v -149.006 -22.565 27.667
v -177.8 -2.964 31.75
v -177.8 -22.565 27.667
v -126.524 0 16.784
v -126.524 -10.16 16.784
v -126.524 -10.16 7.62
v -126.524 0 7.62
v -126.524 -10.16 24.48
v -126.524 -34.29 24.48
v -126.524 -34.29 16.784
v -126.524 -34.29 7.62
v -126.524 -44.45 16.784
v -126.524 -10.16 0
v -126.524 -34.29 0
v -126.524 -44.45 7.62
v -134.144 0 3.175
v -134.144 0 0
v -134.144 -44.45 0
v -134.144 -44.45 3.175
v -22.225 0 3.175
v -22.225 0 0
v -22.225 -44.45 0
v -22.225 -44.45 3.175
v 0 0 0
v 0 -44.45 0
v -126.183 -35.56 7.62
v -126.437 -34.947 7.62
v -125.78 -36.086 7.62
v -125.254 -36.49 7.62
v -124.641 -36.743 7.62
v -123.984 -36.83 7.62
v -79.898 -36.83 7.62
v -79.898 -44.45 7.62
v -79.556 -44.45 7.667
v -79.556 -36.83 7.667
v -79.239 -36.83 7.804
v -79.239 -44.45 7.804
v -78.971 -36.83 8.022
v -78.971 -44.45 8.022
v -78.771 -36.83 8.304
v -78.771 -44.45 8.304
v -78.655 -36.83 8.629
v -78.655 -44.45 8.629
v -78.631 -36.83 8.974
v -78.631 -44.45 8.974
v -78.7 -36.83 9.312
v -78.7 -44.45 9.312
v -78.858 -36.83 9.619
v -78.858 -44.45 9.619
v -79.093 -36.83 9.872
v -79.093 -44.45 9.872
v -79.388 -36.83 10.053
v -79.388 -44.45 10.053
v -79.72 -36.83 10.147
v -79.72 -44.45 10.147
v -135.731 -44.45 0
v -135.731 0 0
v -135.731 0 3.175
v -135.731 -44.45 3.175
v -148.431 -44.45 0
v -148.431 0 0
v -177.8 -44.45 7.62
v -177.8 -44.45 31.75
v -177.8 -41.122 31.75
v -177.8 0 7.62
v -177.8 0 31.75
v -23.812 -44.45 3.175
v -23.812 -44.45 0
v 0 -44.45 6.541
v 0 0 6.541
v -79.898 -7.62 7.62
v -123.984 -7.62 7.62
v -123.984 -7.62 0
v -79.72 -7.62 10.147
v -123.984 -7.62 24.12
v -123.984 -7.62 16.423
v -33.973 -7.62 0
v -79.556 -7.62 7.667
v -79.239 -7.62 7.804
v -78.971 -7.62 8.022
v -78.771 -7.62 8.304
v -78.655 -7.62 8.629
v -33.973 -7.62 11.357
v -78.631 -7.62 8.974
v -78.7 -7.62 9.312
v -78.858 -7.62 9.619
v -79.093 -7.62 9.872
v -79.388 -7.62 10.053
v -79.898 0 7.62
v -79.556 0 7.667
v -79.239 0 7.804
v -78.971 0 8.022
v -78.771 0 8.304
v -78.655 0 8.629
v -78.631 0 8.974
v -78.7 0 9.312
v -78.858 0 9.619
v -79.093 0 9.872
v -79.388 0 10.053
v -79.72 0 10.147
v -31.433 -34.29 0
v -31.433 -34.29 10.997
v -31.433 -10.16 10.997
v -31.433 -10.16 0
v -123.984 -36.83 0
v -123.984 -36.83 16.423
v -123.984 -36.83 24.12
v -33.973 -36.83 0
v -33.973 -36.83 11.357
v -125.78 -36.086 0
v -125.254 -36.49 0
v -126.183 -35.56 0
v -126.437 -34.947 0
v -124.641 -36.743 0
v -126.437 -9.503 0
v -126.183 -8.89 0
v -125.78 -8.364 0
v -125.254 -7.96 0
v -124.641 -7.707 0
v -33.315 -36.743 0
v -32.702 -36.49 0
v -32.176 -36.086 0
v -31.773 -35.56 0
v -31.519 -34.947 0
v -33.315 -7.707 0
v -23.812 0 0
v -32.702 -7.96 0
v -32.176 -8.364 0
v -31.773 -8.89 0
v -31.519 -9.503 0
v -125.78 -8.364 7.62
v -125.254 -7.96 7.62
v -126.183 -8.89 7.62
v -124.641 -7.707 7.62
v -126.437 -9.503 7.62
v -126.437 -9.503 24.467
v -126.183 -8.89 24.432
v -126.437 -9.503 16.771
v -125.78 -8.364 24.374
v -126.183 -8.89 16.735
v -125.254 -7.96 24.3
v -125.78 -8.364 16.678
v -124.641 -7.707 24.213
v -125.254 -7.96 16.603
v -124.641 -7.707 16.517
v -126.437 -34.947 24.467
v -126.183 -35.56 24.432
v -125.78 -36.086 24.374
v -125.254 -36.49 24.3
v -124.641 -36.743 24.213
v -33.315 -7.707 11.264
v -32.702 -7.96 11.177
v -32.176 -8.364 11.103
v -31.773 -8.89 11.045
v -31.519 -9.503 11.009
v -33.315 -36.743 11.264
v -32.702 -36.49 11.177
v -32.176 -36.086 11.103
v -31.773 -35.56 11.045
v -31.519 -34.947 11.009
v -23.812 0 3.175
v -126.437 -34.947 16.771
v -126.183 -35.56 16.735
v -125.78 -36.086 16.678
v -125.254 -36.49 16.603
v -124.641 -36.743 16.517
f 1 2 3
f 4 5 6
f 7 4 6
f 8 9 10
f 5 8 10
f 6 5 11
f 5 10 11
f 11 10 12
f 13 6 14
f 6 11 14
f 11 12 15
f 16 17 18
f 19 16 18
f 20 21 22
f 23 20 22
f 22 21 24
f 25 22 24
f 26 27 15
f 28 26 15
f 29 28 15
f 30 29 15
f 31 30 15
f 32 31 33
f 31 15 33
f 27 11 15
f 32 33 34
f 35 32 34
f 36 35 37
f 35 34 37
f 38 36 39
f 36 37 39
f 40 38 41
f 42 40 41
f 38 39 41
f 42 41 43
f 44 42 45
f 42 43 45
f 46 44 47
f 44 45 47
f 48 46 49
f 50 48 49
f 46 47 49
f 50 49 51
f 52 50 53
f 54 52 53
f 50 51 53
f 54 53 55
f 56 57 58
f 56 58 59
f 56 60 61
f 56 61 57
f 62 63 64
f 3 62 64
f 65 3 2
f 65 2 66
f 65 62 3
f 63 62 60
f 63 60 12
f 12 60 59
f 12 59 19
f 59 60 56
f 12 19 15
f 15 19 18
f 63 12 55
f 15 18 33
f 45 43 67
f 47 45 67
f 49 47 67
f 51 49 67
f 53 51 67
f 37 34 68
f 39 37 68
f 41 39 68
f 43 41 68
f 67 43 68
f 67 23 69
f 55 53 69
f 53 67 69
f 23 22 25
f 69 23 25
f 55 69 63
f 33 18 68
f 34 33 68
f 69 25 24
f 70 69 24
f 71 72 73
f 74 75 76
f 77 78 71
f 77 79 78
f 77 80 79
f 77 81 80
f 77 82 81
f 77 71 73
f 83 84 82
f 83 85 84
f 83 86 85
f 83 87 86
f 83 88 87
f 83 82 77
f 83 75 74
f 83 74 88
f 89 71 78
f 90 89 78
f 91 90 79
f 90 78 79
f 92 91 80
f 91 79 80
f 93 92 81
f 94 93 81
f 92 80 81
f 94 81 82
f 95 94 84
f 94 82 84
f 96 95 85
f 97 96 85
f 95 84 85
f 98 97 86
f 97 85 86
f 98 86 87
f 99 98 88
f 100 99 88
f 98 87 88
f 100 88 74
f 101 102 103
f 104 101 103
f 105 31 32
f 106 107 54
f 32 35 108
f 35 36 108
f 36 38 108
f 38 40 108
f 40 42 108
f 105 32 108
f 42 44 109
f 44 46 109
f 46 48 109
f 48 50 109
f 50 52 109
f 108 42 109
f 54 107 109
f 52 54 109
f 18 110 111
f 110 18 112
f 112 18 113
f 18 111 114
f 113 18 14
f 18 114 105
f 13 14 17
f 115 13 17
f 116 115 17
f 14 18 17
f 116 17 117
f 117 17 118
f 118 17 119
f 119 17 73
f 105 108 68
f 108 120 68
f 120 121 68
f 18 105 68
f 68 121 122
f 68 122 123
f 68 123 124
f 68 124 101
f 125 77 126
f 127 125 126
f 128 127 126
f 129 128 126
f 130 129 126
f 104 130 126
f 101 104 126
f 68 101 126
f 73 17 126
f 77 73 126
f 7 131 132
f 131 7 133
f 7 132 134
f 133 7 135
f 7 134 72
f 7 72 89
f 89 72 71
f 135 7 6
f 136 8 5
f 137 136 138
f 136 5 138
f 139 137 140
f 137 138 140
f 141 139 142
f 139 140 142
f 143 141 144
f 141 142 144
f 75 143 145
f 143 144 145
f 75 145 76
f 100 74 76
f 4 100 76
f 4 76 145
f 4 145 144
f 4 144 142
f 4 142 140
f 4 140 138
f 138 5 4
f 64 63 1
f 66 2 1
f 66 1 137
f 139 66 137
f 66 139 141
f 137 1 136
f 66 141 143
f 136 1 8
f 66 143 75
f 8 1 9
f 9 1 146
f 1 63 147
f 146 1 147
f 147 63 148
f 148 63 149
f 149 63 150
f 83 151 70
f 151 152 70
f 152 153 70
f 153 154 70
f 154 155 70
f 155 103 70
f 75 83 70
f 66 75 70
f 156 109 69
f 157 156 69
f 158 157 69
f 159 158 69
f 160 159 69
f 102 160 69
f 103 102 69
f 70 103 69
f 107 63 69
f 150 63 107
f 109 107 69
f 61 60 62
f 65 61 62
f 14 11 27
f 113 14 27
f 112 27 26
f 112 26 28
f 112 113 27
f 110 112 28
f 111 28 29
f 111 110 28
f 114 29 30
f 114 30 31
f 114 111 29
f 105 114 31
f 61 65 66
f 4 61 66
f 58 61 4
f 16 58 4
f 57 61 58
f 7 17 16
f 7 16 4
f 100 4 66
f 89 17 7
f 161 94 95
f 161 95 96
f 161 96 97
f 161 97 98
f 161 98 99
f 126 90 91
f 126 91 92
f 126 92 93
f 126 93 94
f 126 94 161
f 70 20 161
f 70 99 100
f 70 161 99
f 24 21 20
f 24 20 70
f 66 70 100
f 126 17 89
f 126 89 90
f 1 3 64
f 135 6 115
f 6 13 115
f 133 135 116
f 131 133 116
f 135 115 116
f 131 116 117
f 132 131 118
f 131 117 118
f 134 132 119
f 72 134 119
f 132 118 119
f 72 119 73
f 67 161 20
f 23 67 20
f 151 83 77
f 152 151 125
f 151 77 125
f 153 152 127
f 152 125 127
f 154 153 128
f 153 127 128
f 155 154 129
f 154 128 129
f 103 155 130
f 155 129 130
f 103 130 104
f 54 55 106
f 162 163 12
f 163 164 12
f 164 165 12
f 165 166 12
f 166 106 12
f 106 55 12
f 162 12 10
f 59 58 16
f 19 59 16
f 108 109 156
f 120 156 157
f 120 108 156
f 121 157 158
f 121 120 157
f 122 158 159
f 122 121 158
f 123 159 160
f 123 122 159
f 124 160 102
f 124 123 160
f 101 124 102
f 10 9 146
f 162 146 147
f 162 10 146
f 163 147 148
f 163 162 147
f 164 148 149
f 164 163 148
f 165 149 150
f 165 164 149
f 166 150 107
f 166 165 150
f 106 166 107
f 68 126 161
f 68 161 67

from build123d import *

# Parameters (mm, degrees)
F0_W      = 177.8
F0_H      = 44.45
F1_DEPTH  = 31.75
F2_W      = 1.5875
F2_H      = 44.45
F3_DEPTH  = 3.175
F4_W      = 95.09125
F4_H      = 29.21
F5_DEPTH  = 31.751
F7_DEPTH  = 44.451
F9_DEPTH  = 44.451
F11_DEPTH = 44.451
F13_DEPTH = 177.801
F14_R     = 2.54


with BuildPart() as f1:
    # F0 (on Top) → F1 (new body)
    with BuildSketch(Plane.XY):
        with Locations((-88.9, -22.225)):
            Rectangle(F0_W, F0_H)
    extrude(amount=F1_DEPTH)

    # F2 (on face) → F3 (cut)
    with BuildSketch(Plane(origin=(0, 0, 0), x_dir=(1, 0, 0), z_dir=(0, 0, -1))):
        with Locations((-23.01875, 22.225)):
            Rectangle(F2_W, F2_H)
        with Locations((-134.9375, 22.225)):
            Rectangle(F2_W, F2_H)
    extrude(amount=-F3_DEPTH, mode=Mode.SUBTRACT)

    # F4 (on face) → F5 (cut, through all)
    with BuildSketch(Plane.XY.offset(31.75)):
        with Locations((-78.978125, -22.225)):
            Rectangle(F4_W, F4_H)
    extrude(amount=-F5_DEPTH, mode=Mode.SUBTRACT)

    # F6 (on face) → F7 (cut, through all)
    with BuildSketch(Plane.XZ.offset(44.45)):
        Polygon((-177.8, 31.75), (0, 6.540501), (0, 31.75), align=None)
    extrude(amount=-F7_DEPTH, mode=Mode.SUBTRACT)

    # F8 (on face) → F9 (cut, through all)
    with BuildSketch(Plane.XZ.offset(44.45)):
        with BuildLine():
            Line((-126.52375, 16.783548), (-126.52375, 7.62))
            Line((-126.52375, 7.62), (-79.898132, 7.62))
            ThreePointArc((-79.898132, 7.62), (-78.63128, 8.800636), (-79.719847, 10.147424))
            Line((-79.719847, 10.147424), (-126.52375, 16.783548))
        make_face()
    extrude(amount=-F9_DEPTH, mode=Mode.SUBTRACT)

    # F10 (on face) → F11 (cut, through all)
    with BuildSketch(Plane.XZ.offset(44.45)):
        Polygon((-177.8, 0), (-148.43125, 0), (-177.8, 7.62), align=None)
    extrude(amount=-F11_DEPTH, mode=Mode.SUBTRACT)

    # F12 (on face) → F13 (cut, through all)
    with BuildSketch(Plane(origin=(-177.8, 0, 0), x_dir=(0, -1, 0), z_dir=(-1, 0, 0))):
        Polygon((41.121738, 31.75), (2.964308, 31.75), (22.565205, 27.667448), align=None)
    extrude(amount=-F13_DEPTH, mode=Mode.SUBTRACT)

    # F14
    f14_edges = [f1.edges().sort_by_distance(p)[0] for p in [
        (-31.4325, -36.83, 5.49859),
        (-126.52375, -36.83, 3.81),
        (-126.52375, -36.83, 20.631654),
        (-126.52375, -7.62, 3.81),
        (-126.52375, -7.62, 20.631654),
        (-31.4325, -7.62, 5.49859),
    ]]
    fillet(f14_edges, radius=F14_R)


solid = f1.part
